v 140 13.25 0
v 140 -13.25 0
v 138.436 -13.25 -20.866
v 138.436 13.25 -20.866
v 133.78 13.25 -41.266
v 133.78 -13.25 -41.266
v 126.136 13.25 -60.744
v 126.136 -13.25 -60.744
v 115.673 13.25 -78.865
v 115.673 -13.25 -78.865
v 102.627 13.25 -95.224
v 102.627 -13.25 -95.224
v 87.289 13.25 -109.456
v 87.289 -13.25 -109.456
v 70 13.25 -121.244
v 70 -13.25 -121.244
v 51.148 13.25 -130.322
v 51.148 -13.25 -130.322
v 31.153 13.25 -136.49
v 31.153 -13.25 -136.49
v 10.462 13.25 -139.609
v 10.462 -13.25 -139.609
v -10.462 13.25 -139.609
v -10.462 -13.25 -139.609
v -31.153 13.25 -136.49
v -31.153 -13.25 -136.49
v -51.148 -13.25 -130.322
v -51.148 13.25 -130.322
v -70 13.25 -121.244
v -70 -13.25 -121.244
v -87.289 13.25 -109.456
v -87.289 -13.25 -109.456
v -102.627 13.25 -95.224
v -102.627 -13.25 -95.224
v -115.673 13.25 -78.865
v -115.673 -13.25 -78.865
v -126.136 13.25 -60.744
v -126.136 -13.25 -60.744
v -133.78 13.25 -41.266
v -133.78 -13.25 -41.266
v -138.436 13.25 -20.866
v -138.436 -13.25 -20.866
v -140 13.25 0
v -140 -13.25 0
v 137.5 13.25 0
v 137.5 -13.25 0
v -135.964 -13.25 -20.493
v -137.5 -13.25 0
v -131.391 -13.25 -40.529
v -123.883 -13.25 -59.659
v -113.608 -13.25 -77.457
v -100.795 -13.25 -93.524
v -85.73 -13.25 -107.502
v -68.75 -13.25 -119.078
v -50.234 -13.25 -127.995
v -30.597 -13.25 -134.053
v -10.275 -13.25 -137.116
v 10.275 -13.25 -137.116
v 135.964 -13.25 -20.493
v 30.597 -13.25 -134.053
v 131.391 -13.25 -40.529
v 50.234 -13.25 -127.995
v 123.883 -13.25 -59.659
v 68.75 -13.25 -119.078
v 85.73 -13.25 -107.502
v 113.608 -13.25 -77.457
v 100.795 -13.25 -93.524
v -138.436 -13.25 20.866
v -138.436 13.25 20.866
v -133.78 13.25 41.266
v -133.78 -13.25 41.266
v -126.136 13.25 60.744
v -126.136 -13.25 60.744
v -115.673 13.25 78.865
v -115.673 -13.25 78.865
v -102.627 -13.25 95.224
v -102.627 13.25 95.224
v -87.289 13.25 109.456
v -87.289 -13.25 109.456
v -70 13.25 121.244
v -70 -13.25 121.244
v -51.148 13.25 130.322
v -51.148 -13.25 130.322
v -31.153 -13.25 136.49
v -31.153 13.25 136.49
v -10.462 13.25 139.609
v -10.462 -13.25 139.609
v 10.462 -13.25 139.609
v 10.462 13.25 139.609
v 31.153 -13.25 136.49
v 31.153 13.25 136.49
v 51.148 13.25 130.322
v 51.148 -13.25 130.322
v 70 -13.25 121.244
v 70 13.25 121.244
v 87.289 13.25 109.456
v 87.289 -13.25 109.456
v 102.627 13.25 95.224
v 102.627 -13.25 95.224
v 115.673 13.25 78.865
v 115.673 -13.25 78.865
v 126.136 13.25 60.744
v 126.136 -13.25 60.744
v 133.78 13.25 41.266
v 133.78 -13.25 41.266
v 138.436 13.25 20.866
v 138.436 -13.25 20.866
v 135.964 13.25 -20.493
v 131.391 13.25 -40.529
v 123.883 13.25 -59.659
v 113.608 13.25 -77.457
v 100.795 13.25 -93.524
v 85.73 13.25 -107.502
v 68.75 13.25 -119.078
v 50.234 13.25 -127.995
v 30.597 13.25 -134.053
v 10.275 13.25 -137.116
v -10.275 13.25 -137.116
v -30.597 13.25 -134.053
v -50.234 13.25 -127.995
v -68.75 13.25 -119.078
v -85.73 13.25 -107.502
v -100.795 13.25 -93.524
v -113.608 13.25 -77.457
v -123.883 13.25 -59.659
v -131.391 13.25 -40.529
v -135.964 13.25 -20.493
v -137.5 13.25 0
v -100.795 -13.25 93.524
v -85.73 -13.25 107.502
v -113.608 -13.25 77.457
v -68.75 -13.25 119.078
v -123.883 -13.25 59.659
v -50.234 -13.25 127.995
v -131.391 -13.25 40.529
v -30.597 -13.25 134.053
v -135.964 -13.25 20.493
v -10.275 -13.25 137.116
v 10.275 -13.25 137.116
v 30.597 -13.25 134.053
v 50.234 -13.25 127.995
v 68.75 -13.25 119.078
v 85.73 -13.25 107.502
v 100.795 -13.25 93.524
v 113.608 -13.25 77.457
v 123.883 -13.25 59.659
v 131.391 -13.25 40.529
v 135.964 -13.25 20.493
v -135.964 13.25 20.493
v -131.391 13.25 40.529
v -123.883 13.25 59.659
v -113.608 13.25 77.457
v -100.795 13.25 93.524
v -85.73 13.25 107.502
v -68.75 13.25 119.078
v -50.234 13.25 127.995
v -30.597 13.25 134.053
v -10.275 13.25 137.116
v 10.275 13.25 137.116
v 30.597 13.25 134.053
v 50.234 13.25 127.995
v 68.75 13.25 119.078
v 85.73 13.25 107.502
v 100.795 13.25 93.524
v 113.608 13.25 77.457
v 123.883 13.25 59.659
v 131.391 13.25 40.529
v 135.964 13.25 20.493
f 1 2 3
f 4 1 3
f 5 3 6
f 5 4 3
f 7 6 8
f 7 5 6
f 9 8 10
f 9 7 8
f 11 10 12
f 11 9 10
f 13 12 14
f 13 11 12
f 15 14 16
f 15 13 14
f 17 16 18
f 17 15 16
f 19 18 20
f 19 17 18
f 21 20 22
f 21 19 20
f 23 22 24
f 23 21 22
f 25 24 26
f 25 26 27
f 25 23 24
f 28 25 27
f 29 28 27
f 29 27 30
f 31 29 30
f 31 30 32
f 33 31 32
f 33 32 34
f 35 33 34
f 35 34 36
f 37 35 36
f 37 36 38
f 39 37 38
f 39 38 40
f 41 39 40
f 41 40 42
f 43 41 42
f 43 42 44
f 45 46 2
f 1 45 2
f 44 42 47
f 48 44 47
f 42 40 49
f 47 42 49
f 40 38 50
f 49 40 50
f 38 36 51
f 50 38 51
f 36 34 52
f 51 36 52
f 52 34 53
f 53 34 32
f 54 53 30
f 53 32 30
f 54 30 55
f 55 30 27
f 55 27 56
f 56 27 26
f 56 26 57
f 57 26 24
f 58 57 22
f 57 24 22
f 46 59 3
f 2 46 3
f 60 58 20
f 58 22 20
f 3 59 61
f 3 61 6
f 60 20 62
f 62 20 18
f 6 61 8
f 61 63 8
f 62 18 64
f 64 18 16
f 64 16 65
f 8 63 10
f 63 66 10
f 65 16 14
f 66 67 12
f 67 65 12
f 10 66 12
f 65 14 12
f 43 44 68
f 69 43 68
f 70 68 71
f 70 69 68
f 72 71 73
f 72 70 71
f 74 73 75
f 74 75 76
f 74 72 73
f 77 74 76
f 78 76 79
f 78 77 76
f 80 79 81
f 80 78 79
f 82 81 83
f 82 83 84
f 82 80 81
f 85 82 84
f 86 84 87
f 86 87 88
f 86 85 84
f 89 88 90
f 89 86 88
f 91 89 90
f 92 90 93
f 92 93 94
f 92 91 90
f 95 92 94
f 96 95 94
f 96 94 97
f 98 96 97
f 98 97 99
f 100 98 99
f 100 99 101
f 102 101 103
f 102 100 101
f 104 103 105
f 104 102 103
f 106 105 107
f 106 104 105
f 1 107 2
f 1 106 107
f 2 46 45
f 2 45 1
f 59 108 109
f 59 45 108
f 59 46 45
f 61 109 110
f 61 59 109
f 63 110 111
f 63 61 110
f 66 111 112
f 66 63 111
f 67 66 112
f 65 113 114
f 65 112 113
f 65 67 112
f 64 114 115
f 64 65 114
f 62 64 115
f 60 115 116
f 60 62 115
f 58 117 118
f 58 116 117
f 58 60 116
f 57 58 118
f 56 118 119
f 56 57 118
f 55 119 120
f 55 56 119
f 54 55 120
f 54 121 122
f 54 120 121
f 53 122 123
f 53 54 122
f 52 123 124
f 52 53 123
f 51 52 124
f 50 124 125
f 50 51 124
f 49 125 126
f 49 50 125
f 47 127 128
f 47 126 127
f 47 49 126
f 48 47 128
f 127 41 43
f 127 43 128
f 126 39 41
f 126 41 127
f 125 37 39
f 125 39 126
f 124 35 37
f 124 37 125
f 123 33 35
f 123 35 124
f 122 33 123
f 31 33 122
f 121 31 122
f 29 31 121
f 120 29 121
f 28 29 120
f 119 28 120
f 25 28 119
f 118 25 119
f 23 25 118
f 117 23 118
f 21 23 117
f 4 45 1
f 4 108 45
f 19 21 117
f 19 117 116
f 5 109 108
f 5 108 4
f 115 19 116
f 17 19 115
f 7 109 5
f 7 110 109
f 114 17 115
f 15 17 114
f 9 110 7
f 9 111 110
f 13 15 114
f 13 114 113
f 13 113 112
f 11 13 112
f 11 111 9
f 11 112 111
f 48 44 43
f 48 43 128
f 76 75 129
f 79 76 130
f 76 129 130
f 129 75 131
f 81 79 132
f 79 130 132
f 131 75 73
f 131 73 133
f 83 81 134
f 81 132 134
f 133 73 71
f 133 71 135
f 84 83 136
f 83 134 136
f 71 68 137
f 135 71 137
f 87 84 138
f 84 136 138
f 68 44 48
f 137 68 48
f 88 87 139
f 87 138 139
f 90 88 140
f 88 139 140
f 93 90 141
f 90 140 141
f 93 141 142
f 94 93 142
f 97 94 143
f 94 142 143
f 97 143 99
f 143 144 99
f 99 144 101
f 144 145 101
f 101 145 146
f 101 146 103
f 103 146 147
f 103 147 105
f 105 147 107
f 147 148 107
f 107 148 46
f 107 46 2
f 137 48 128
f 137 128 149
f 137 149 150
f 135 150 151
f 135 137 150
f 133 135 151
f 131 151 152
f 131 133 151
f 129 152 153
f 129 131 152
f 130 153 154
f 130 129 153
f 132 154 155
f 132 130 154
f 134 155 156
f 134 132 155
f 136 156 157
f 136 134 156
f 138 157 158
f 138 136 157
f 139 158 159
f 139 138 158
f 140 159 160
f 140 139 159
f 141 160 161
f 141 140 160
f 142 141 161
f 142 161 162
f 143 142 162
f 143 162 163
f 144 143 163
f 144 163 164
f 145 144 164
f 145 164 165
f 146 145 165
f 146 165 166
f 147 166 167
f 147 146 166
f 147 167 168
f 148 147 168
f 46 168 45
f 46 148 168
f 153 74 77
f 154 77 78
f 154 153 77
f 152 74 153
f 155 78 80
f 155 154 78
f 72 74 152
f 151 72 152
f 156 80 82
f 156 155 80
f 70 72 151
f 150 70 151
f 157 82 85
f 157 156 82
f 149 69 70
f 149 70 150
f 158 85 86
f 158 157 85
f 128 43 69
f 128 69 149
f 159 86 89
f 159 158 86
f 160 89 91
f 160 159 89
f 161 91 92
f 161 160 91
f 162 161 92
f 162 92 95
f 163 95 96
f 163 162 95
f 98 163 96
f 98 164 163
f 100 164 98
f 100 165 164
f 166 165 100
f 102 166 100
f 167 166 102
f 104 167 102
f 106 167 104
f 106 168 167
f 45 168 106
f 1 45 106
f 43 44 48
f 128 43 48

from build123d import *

# Parameters (mm, degrees)
BOSS_EXTRUDE1_DEPTH = 13.25


with BuildPart() as part:
    # Sketch2 → Boss-Extrude1 (new, symmetric)
    with BuildSketch(Plane(origin=(0, 0, 0), x_dir=(1, 0, 0), z_dir=(0, 1, 0))):
        with BuildLine():
            ThreePointArc((53.57568053111268, 129.34313455158008), (8.57e-15, 139.99999999999997), (-53.57568053111271, 129.3431345515801))
            ThreePointArc((-53.57568053111271, 129.3431345515801), (-98.99494936611619, 98.99494936611717), (-129.34313455157954, 53.57568053111404))
            ThreePointArc((-129.34313455157954, 53.57568053111404), (-140, 1.50928e-12), (-129.3431345515807, -53.57568053111133))
            ThreePointArc((-129.3431345515807, -53.57568053111133), (-98.99494936611755, -98.9949493661158), (-53.57568053111358, -129.34313455157968))
            ThreePointArc((-53.57568053111358, -129.34313455157968), (-9.8619e-13, -139.99999999999997), (53.57568053111179, -129.34313455158048))
            ThreePointArc((53.57568053111179, -129.34313455158048), (98.99494936611613, -98.99494936611717), (129.34313455157988, -53.57568053111315))
            ThreePointArc((129.34313455157988, -53.57568053111315), (139.99999999999997, -5.0515e-13), (129.3431345515803, 53.57568053111223))
            ThreePointArc((129.3431345515803, 53.57568053111223), (98.99494936611686, 98.9949493661165), (53.57568053111268, 129.34313455158008))
        make_face()
        with BuildLine():
            ThreePointArc((52.61897195019996, 127.0334357203019), (8.42e-15, 137.50000000000003), (-52.618971950199956, 127.0334357203019))
            ThreePointArc((-52.618971950199956, 127.0334357203019), (-97.22718241314976, 97.22718241315081), (-127.03343572030134, 52.61897195020129))
            ThreePointArc((-127.03343572030134, 52.61897195020129), (-137.5, 1.48233e-12), (-127.0334357203025, -52.61897195019865))
            ThreePointArc((-127.0334357203025, -52.61897195019865), (-97.22718241315121, -97.22718241314949), (-52.61897195020085, -127.03343572030148))
            ThreePointArc((-52.61897195020085, -127.03343572030148), (-9.6858e-13, -137.49999999999997), (52.6189719501991, -127.03343572030226))
            ThreePointArc((52.6189719501991, -127.03343572030226), (97.2271824131498, -97.22718241315081), (127.03343572030171, -52.61897195020042))
            ThreePointArc((127.03343572030171, -52.61897195020042), (137.50000000000003, -4.885e-13), (127.03343572030212, 52.61897195019953))
            ThreePointArc((127.03343572030212, 52.61897195019953), (97.2271824131505, 97.22718241315015), (52.61897195019996, 127.0334357203019))
        make_face(mode=Mode.SUBTRACT)
    extrude(amount=BOSS_EXTRUDE1_DEPTH, both=True)


with BuildPart() as body_2:
    # Split1: the piece on the far side of the plane
    add(part.part)
    split(bisect_by=Plane.XY, keep=Keep.BOTTOM)


with BuildPart() as part_1:
    add(part.part)

    # Split1
    split(bisect_by=Plane.XY, keep=Keep.TOP)


solid = Compound([body_2.part, part_1.part])
